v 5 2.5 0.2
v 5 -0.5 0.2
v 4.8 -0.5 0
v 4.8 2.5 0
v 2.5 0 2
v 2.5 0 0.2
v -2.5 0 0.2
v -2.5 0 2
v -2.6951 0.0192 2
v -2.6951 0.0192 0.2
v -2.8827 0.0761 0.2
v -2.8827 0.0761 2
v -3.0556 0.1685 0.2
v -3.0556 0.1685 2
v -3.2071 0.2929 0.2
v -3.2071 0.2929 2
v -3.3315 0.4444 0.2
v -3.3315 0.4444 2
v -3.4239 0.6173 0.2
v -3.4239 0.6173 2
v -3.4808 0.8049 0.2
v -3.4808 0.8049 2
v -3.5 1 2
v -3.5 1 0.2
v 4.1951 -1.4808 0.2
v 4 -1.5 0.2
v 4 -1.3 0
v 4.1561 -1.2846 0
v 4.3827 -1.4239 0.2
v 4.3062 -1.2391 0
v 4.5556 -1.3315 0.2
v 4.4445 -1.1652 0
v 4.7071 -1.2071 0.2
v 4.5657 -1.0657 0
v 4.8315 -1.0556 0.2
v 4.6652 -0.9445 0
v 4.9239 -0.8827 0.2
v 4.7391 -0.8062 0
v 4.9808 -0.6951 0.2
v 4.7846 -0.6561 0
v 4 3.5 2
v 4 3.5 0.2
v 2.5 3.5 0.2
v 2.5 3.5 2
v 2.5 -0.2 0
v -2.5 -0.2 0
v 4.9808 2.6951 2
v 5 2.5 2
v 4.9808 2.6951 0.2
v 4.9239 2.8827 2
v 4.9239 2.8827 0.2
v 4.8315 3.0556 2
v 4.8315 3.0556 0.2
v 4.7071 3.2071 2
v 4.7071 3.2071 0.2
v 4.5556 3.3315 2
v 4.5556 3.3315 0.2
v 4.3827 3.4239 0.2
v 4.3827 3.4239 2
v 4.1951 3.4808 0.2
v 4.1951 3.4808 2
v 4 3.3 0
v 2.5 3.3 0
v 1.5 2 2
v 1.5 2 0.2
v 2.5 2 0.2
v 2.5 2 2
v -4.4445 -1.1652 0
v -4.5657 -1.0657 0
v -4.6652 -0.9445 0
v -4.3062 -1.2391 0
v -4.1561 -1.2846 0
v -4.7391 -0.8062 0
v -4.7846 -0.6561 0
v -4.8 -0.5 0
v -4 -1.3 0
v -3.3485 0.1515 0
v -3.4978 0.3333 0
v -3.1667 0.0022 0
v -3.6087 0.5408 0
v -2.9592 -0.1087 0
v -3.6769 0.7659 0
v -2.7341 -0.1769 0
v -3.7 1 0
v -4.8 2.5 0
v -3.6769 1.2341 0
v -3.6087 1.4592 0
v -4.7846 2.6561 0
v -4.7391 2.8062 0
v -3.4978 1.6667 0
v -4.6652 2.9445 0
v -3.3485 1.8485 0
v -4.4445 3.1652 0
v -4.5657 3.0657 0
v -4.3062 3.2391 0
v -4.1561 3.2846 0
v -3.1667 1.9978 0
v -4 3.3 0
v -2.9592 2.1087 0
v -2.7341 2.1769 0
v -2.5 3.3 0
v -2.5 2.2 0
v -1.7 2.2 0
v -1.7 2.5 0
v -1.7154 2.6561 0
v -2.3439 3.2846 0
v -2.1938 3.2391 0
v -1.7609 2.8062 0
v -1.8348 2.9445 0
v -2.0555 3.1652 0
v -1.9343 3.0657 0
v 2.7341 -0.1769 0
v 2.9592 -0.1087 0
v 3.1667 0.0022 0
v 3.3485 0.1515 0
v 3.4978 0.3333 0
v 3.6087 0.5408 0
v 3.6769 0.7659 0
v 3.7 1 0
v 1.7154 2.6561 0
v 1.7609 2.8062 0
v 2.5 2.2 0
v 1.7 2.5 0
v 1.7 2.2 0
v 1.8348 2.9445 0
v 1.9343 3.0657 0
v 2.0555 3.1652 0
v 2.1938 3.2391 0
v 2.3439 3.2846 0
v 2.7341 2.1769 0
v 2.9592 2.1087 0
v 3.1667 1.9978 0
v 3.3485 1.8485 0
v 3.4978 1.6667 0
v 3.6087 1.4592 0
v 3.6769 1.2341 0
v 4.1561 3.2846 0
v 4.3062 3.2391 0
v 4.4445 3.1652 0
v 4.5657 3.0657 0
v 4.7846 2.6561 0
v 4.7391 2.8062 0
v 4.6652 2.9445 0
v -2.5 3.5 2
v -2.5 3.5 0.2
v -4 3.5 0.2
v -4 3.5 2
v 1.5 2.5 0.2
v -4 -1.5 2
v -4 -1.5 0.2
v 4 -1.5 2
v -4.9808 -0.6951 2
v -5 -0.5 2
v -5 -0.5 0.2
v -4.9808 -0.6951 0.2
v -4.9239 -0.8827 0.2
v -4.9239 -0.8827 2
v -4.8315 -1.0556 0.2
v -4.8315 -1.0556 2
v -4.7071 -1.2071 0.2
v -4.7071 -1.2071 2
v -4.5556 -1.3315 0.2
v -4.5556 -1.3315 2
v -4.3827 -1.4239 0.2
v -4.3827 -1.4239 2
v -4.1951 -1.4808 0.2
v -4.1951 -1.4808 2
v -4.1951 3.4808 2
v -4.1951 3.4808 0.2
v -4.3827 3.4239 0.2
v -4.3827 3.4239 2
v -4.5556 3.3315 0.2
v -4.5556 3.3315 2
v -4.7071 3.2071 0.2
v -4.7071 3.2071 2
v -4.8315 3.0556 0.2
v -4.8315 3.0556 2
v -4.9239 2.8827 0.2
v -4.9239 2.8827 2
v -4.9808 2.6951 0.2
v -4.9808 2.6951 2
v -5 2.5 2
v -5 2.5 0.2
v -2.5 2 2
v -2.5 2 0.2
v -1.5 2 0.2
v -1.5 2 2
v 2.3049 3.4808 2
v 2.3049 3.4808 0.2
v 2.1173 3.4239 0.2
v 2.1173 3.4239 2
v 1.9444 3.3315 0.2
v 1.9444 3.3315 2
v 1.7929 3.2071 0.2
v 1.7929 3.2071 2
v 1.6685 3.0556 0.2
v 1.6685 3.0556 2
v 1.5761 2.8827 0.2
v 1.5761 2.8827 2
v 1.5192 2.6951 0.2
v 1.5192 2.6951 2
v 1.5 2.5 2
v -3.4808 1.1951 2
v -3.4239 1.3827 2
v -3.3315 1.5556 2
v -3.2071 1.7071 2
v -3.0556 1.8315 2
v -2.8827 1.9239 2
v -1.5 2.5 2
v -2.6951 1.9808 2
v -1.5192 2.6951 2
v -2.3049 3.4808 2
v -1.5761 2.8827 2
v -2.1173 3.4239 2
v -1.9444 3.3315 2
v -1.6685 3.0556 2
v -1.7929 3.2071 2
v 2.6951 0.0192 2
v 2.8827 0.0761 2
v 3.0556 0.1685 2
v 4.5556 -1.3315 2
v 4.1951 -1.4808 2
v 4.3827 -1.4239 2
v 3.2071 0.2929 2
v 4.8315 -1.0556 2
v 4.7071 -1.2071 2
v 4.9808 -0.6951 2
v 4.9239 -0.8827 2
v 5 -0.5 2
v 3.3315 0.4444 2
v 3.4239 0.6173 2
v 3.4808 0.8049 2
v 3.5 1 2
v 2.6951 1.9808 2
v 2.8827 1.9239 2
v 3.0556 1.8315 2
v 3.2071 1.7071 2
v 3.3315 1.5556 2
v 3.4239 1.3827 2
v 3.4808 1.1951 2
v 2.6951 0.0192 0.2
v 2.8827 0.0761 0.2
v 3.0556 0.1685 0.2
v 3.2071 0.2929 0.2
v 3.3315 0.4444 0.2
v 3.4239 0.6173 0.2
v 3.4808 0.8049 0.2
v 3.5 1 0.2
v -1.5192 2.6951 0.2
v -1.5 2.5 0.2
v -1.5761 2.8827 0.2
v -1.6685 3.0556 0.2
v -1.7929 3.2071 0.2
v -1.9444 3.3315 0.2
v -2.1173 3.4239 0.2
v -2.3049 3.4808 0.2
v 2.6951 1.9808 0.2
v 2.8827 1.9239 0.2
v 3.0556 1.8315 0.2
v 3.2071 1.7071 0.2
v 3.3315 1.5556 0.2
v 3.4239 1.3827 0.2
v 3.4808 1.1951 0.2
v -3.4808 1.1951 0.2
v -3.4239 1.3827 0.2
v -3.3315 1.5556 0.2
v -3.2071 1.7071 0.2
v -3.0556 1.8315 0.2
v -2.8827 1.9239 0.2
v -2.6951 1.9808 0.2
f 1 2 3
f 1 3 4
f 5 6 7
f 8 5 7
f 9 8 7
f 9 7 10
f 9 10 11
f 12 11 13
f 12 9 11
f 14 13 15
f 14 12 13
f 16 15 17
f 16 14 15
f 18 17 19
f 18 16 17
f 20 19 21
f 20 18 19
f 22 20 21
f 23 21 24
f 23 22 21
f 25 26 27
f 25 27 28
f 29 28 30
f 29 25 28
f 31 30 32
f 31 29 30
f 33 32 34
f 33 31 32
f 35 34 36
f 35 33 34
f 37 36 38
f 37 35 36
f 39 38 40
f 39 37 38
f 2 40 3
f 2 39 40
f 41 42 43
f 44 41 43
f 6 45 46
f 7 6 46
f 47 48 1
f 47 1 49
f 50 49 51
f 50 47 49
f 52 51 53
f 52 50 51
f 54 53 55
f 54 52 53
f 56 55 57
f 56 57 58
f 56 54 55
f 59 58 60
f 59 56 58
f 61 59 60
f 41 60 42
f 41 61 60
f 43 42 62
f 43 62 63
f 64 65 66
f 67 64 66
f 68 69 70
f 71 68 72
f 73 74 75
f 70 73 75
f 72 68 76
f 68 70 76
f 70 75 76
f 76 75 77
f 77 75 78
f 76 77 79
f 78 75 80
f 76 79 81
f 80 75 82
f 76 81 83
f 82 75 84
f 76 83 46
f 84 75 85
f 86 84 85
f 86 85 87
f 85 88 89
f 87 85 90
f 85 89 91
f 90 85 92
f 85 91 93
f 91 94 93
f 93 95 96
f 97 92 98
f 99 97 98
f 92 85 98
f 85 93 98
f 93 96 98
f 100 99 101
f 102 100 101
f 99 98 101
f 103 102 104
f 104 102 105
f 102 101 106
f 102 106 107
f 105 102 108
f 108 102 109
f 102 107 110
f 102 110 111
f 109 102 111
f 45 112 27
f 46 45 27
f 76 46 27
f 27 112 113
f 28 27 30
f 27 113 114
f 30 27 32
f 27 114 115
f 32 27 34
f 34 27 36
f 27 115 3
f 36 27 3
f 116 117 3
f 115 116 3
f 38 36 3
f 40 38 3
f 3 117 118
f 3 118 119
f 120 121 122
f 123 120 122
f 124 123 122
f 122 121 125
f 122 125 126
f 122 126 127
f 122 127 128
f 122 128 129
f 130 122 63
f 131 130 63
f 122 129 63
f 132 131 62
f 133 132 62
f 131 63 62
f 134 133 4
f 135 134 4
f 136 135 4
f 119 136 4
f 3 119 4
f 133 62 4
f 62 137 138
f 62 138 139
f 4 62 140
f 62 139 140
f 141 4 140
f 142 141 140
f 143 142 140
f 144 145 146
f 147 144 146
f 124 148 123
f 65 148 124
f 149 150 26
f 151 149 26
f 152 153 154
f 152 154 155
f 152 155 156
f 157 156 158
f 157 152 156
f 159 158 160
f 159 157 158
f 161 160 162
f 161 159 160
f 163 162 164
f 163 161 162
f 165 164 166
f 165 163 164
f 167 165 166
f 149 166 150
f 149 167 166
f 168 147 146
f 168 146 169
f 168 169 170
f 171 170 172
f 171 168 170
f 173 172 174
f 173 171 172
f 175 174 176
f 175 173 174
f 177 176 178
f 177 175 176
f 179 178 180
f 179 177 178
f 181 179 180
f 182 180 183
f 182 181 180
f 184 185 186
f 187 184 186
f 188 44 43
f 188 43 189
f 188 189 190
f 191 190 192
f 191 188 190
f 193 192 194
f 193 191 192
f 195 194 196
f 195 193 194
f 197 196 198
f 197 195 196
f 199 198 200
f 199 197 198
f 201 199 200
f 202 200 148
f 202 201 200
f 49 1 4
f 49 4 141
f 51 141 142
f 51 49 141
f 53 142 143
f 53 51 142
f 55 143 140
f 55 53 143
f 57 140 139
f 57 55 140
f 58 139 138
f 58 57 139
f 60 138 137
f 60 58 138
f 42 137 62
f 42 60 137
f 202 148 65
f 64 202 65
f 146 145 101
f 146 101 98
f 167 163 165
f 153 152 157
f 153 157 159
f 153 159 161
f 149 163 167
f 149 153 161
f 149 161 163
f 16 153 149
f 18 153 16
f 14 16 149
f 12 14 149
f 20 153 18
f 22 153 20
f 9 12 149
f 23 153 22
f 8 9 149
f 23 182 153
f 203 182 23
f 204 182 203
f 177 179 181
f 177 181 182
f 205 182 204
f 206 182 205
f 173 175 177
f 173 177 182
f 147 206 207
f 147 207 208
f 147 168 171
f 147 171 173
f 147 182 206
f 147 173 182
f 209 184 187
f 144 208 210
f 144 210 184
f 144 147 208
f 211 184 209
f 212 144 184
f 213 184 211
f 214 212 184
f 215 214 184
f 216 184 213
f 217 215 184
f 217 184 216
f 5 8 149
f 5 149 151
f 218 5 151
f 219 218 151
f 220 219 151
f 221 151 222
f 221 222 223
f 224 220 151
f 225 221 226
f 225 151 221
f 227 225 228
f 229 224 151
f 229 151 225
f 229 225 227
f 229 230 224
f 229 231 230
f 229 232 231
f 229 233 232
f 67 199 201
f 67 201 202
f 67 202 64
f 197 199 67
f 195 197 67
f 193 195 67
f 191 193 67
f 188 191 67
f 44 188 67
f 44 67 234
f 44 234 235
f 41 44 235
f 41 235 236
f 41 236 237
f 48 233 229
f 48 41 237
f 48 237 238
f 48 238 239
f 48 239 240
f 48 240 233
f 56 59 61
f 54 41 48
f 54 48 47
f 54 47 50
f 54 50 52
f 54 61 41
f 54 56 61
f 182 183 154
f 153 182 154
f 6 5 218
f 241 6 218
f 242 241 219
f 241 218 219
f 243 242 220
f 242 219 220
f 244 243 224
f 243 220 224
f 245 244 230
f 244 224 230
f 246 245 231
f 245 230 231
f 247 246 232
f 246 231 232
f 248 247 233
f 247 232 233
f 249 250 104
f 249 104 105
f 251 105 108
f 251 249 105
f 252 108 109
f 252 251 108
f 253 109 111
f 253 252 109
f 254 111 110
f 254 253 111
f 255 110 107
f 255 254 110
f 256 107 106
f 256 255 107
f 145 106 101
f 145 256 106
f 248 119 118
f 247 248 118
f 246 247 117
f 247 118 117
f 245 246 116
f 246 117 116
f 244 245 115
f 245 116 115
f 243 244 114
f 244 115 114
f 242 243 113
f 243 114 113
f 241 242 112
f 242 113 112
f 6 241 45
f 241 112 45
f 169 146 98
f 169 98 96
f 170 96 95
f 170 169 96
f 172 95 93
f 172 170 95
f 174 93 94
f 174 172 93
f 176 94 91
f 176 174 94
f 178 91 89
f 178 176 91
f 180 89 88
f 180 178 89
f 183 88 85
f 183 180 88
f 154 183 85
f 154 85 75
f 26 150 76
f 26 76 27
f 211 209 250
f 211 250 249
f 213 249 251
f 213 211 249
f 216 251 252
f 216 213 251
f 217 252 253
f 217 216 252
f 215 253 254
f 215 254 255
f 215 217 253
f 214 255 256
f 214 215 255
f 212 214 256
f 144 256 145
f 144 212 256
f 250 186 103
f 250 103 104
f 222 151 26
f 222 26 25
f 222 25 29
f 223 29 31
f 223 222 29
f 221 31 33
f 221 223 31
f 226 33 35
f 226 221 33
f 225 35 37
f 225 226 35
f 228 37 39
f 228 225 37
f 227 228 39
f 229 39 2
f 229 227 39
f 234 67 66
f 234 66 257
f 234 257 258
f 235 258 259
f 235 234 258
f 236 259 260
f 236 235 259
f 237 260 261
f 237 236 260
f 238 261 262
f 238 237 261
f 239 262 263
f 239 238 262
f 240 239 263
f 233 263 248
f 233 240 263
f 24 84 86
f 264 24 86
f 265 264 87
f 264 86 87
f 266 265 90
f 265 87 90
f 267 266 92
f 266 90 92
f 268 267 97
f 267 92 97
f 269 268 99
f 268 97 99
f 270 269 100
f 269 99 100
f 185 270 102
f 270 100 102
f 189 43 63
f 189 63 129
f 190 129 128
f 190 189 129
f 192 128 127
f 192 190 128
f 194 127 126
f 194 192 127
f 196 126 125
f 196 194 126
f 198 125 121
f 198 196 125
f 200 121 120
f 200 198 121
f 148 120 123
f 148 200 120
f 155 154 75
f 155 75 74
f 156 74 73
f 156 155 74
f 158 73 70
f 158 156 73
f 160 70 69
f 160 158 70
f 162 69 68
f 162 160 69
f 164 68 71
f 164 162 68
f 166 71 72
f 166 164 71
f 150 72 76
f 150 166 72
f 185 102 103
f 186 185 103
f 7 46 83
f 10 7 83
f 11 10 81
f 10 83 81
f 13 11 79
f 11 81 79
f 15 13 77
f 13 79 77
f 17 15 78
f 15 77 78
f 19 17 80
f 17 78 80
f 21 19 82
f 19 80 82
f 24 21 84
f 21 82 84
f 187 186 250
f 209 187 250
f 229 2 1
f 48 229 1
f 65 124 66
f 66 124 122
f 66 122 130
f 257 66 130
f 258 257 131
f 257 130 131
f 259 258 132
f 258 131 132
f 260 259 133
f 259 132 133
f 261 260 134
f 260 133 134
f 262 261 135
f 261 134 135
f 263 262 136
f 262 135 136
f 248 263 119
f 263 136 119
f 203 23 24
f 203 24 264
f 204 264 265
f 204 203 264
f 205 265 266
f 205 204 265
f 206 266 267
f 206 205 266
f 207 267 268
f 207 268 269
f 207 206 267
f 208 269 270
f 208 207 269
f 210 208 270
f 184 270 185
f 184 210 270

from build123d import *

# Parameters (mm, degrees)
F1_DEPTH = 2
F2_R     = 0.99999
F3_SIZE  = 0.2


# Not quite as in the source:
# - a fillet or chamfer is up to 0.001 mm smaller than in the source, because OpenCascade refuses the exact size


with BuildPart() as f1:
    # F0 (on Top) → F1 (new body)
    with BuildSketch(Plane.XY):
        Polygon((3.5, 0), (0, 0), (-3.5, 0), (-3.5, 2), (-1.5, 2), (-1.5, 3.5), (-5, 3.5), (-5, -1.5), (0, -1.5), (5, -1.5), (5, 3.5), (1.5, 3.5), (1.5, 2), (3.5, 2), align=None)
    extrude(amount=F1_DEPTH)

    # F2 (radius 1 in the source; OpenCascade refuses exactly that, so slightly less here)
    f2_edges = [f1.edges().sort_by_distance(p)[0] for p in [
        (-1.5, 3.5, 1),
        (1.5, 3.5, 1),
        (5, 3.5, 1),
        (5, -1.5, 1),
        (-5, -1.5, 1),
        (-5, 3.5, 1),
        (-3.5, 2, 1),
        (-3.5, 0, 1),
        (3.5, 2, 1),
        (3.5, 0, 1),
    ]]
    fillet(f2_edges, radius=F2_R)

    # F3
    f3_edges = [f1.edges().sort_by_distance(p)[0] for p in [
        (0, 0, 0),
        (3.20711, 0.29289, 0),
        (-3.20711, 0.29289, 0),
        (3.5, 1, 0),
        (-3.5, 1, 0),
        (3.20711, 1.70711, 0),
        (-3.20711, 1.70711, 0),
        (2.000005, 2, 0),
        (-2.000005, 2, 0),
        (1.5, 2.250005, 0),
        (-1.5, 2.250005, 0),
        (1.79289, 3.20711, 0),
        (-1.79289, 3.20711, 0),
        (3.25, 3.5, 0),
        (-3.25, 3.5, 0),
        (4.70711, 3.20711, 0),
        (-4.70711, 3.20711, 0),
        (5, 1, 0),
        (-5, 1, 0),
        (4.70711, -1.20711, 0),
        (-4.70711, -1.20711, 0),
        (0, -1.5, 0),
    ]]
    chamfer(f3_edges, length=F3_SIZE)


solid = f1.part
